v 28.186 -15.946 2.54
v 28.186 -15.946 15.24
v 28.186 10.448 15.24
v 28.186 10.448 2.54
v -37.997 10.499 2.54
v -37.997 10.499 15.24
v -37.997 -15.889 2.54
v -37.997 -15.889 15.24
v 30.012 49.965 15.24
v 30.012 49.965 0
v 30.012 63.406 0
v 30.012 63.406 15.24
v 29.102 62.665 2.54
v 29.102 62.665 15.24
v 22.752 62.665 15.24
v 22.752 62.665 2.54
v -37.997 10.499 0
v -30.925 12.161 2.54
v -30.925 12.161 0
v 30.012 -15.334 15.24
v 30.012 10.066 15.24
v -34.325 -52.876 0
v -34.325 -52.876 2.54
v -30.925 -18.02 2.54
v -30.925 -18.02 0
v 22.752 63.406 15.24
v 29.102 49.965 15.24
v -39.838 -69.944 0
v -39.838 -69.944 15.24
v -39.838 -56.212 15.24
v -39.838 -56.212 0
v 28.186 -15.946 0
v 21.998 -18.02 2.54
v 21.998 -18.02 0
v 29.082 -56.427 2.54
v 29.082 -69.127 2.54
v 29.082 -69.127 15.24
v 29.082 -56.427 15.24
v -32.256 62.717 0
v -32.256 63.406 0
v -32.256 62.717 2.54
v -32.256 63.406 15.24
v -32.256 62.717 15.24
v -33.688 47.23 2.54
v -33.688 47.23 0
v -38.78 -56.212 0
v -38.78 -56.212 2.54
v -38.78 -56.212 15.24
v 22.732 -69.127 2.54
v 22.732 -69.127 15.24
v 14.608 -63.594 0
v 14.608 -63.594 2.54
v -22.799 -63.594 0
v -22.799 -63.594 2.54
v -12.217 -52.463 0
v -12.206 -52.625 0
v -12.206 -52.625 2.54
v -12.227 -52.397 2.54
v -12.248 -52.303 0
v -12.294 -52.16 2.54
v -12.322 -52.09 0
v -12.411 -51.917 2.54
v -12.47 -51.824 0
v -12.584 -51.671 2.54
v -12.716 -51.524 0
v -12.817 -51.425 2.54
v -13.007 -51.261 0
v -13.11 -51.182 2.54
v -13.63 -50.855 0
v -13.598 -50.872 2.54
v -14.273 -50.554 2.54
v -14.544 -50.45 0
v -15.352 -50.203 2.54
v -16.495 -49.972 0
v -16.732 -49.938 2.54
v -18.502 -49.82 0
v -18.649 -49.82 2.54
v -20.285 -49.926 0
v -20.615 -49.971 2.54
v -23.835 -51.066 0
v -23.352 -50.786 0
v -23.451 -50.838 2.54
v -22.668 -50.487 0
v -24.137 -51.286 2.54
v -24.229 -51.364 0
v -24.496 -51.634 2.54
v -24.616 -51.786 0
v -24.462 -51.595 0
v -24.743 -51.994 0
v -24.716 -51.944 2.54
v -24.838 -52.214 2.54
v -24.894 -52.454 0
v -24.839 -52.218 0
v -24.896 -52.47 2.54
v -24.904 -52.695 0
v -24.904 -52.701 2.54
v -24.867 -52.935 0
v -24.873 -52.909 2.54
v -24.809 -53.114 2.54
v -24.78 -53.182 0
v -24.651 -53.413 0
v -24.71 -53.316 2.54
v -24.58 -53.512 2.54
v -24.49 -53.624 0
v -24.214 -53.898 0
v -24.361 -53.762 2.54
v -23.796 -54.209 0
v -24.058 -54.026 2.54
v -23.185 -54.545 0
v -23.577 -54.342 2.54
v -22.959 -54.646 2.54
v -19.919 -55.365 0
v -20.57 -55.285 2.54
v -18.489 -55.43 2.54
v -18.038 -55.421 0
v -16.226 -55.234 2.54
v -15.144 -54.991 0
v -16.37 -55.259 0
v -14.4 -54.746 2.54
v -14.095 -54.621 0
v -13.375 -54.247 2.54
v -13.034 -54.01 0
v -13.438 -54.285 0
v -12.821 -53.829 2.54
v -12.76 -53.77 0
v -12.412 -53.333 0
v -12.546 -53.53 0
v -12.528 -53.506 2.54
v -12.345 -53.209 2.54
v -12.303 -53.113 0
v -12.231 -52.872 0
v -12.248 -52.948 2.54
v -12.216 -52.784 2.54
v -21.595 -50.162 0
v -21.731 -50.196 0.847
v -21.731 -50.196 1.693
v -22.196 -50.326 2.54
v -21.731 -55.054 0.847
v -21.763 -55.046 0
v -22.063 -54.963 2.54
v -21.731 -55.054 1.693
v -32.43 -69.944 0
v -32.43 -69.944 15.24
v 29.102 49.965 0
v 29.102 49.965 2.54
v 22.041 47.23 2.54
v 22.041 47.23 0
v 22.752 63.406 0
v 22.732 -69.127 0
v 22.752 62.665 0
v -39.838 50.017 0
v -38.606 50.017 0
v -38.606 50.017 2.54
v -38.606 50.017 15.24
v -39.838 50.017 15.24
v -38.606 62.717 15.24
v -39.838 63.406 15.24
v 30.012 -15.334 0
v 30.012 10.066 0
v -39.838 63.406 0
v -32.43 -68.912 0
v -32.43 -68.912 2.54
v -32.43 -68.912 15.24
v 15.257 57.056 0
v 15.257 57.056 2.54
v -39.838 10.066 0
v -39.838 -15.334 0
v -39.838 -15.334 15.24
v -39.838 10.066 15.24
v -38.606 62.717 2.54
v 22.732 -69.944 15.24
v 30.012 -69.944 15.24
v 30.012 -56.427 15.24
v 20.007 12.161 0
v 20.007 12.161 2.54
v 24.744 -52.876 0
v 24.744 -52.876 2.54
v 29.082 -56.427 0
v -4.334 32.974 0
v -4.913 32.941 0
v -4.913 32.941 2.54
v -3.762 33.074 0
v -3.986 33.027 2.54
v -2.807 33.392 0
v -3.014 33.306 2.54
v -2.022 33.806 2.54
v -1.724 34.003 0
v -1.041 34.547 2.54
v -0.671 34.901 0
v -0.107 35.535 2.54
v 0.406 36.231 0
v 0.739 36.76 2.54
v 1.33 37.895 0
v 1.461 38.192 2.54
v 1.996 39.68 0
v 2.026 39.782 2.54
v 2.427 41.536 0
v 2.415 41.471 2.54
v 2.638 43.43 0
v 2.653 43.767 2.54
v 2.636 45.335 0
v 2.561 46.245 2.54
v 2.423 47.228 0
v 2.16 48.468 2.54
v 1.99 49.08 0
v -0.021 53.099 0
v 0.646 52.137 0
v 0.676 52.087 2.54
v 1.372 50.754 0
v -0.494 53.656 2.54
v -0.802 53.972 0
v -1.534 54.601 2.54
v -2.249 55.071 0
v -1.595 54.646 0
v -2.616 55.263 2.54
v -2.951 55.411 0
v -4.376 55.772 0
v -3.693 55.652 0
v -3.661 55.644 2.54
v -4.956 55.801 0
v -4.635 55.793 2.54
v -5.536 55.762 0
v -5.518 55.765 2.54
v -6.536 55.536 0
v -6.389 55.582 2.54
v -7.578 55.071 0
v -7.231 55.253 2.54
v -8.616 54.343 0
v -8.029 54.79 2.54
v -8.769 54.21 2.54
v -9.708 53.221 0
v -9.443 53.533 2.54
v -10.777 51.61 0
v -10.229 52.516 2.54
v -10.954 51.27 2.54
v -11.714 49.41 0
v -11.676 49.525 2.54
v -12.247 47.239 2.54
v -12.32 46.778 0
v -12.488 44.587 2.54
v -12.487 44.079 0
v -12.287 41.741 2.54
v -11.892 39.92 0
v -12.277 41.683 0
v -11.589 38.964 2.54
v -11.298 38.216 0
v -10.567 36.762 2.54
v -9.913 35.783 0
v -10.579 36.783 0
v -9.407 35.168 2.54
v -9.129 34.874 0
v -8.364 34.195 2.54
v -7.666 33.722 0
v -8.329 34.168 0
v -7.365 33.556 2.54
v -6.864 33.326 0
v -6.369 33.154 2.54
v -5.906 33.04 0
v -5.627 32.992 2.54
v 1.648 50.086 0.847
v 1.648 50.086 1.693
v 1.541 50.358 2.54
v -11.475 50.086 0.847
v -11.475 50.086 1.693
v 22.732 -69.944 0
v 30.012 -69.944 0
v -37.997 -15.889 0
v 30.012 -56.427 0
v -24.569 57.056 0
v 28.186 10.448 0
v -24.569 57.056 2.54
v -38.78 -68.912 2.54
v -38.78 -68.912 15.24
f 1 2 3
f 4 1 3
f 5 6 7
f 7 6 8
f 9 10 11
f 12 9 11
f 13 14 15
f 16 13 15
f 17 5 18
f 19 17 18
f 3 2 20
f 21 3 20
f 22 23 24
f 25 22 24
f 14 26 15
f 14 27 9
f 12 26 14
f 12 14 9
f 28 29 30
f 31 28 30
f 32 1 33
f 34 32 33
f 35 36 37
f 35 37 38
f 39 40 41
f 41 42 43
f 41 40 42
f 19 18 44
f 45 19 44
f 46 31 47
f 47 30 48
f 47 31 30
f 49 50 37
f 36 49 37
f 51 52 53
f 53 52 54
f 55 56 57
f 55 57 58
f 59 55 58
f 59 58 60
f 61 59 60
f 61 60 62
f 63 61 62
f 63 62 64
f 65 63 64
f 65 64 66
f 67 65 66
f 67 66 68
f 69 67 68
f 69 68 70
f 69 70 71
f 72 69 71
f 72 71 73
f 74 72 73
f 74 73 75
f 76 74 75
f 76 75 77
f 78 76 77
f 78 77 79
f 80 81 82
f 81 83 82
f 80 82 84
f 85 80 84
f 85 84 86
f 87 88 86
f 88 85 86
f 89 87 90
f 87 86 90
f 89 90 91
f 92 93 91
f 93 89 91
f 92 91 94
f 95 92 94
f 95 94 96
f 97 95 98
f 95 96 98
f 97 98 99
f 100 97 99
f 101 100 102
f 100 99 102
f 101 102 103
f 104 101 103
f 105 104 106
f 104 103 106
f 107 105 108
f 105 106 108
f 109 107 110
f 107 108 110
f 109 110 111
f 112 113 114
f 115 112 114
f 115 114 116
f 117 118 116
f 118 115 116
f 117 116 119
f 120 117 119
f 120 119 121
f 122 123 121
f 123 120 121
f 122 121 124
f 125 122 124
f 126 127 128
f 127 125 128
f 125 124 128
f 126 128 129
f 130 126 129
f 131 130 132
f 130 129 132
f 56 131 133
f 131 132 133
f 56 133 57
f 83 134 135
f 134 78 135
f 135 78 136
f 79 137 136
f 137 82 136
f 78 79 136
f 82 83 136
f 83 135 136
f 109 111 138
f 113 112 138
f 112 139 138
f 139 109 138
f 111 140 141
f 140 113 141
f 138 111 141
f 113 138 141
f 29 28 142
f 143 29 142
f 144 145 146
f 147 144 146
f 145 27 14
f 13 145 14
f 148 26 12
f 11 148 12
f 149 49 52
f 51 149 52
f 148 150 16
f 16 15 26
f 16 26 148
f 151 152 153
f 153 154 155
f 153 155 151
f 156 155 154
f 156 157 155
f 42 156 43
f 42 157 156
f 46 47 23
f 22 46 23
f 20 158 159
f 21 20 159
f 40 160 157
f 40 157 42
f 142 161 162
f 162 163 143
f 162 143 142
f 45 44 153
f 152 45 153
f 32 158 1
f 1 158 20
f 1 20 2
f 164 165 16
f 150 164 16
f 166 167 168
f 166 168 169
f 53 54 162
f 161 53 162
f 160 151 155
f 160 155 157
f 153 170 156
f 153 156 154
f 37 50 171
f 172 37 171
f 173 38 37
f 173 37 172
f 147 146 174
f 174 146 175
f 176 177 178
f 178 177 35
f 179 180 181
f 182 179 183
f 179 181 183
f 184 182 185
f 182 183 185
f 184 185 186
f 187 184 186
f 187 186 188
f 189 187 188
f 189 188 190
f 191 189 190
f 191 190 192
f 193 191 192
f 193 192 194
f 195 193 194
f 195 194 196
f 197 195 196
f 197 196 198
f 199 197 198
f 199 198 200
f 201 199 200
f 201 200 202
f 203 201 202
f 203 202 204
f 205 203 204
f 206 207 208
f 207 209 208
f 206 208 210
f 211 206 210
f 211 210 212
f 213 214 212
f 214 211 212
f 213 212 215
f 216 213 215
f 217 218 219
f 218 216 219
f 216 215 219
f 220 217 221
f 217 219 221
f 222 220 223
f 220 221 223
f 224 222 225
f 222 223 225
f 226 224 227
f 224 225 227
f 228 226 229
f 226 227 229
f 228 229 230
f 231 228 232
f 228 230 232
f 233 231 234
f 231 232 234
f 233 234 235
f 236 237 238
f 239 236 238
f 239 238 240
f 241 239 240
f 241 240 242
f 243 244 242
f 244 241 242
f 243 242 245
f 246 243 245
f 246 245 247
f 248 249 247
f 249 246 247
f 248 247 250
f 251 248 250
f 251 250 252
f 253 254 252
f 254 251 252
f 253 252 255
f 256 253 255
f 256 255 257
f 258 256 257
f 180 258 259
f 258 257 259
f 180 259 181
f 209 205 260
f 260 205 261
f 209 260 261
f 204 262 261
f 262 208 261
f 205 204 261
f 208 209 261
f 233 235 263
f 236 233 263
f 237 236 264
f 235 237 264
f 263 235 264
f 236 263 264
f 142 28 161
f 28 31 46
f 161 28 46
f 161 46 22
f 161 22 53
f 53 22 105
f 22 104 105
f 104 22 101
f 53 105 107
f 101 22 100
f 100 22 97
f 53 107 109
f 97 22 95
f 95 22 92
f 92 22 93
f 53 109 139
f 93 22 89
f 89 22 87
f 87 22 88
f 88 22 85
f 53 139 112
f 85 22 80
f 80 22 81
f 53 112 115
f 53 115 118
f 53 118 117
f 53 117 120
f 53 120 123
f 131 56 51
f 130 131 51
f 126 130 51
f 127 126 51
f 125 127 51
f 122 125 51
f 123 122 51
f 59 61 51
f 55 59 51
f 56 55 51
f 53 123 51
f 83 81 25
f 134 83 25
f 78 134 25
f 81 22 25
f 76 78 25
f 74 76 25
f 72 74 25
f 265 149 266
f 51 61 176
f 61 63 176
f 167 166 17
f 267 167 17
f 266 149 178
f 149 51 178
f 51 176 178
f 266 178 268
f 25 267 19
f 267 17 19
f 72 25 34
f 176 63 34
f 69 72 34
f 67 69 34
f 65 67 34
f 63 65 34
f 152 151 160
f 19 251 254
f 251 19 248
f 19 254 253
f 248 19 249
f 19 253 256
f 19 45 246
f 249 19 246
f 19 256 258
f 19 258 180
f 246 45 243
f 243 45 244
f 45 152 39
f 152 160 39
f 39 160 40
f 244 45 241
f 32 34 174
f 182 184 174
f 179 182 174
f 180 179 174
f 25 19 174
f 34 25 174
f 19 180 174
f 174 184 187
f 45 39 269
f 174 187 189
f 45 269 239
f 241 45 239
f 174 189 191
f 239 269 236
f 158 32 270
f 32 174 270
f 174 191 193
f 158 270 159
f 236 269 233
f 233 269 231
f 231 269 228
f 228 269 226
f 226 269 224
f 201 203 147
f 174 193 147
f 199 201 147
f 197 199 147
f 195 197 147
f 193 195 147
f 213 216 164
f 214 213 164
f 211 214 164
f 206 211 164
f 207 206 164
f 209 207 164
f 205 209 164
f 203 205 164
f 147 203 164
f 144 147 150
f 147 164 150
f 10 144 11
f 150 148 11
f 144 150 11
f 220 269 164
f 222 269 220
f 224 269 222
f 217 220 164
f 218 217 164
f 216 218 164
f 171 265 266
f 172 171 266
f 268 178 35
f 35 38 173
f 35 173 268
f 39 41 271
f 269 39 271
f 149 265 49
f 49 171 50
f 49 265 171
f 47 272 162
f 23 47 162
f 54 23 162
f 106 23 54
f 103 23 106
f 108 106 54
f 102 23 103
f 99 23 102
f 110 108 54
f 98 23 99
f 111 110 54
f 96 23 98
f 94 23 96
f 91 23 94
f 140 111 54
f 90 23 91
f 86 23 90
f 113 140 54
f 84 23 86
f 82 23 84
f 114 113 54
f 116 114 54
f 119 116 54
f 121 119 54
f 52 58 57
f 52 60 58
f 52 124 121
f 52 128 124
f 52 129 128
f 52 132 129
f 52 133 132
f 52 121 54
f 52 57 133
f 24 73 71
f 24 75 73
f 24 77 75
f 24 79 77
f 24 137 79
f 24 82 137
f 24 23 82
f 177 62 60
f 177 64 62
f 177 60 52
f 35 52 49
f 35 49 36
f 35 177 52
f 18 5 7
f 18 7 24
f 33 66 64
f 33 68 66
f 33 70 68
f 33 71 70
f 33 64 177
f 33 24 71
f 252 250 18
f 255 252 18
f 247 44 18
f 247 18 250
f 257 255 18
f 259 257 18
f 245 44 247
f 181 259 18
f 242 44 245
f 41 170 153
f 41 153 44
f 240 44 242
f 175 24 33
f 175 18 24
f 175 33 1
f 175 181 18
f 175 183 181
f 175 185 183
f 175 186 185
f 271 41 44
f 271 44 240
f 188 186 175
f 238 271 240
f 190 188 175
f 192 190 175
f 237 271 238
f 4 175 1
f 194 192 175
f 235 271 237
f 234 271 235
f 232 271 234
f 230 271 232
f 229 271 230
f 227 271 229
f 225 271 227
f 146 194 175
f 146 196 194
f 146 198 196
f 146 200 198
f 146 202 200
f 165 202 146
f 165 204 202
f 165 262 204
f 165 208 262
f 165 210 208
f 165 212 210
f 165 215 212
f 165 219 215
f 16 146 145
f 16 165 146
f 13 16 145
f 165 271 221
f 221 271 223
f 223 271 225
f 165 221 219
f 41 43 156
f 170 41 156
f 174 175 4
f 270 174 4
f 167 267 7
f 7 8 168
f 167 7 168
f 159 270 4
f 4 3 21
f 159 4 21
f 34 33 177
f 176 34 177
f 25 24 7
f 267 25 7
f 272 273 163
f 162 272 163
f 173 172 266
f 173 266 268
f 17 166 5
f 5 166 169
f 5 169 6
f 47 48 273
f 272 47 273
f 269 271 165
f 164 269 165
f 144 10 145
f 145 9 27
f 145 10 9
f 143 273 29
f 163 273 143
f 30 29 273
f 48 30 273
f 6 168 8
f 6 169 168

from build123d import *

# Parameters (mm, degrees)
F0_W     = 69.85
F0_H     = 133.35
F1_DEPTH = 15.24
F3_DEPTH = 15.241
F4_DEPTH = 15.241
F5_DEPTH = 12.7
F6_DEPTH = 15.2410001


# Not quite as in the source:
# - a feature names something its author has since deleted; it is built from what else it names


with BuildPart() as f1:
    # F0 (on Top) → F1 (new body)
    with BuildSketch(Plane.XY):
        with Locations((-4.9132461604, -3.2689645886)):
            Rectangle(F0_W, F0_H)
    extrude(amount=F1_DEPTH)

    # F2 (on face) → F3 (cut, through all)
    with BuildSketch(Plane.XY.offset(15.24)):
        Polygon((-4.9132461604, 63.4060354114), (-32.2555484414, 63.4060354114), (-32.2555484414, 62.717136082), (-24.5693009347, 57.0560354114), (-4.9132461604, 57.0560354114), align=None)
        Polygon((-38.6055484414, 50.017136082), (-39.8382461604, 50.017136082), (-39.8382461604, 10.0660354114), (-37.9972373044, 10.4986778455), (-30.9245064855, 12.1607901528), (-33.6875207722, 47.2298189998), align=None)
        Polygon((22.7516740561, 63.4060354114), (-4.9132461604, 63.4060354114), (-4.9132461604, 57.0560354114), (15.2570633218, 57.0560354114), (22.7516740561, 62.6652065337), align=None)
        Polygon((-37.9972373044, -15.8886924859), (-39.8382461604, -15.3339645886), (-39.8382461604, -55.9739645886), (-39.8382461604, -56.2118504524), (-38.7796634255, -56.2118504524), (-34.3251377344, -52.876316011), (-30.9245064855, -18.0198289454), align=None)
        Polygon((30.0117538396, 49.9652065337), (29.1016740561, 49.9652065337), (22.0408134996, 47.2298189998), (20.0073712407, 12.1607901528), (28.1864475644, 10.4482248105), (30.0117538396, 10.0660354114), align=None)
        Polygon((-32.4296634255, -68.9118504524), (-32.4296634255, -69.9439645886), (-6.858468987, -69.9439645886), (-6.858468987, -63.5939645886), (-22.7989349514, -63.5939645886), align=None)
        Polygon((30.0117538396, -55.9739645886), (30.0117538396, -15.3339645886), (28.1864475644, -15.9457166114), (21.9978448004, -18.0198289454), (24.7441133717, -52.876316011), (29.0817226684, -56.4274404526), (30.0117538396, -56.4274404526), align=None)
        Polygon((-6.858468987, -63.5939645886), (-6.858468987, -69.9439645886), (22.7317226684, -69.9439645886), (22.7317226684, -69.1274404526), (14.6080274135, -63.5939645886), align=None)
    extrude(amount=-F3_DEPTH, mode=Mode.SUBTRACT)

    # F2 (on face) → F4 (cut, through all)
    with BuildSketch(Plane.XY.offset(15.24)):
        with BuildLine():
            add(Edge.make_bspline(
                [(-4.9132461604, 32.9410274994), (8.2097492076, 32.9410274994), (1.6482515236, 50.0860274994), (-4.9132461604, 67.2310274994), (-11.4747438444, 50.0860274994), (-18.0362415283, 32.9410274994), (-4.9132461604, 32.9410274994)],
                knots=[0, 0, 0, 2.0943951024, 2.0943951024, 4.1887902048, 4.1887902048, 6.2831853072, 6.2831853072, 6.2831853072], degree=2, weights=[1, 0.5, 1, 0.5, 1, 0.5, 1]))
        make_face()
    extrude(amount=-F4_DEPTH, mode=Mode.SUBTRACT)

    # F2 (on face) → F5 (cut)
    with BuildSketch(Plane.XY.offset(15.24)):
        Polygon((-24.5693009347, 57.0560354114), (-32.2555484414, 62.717136082), (-38.6055484414, 62.717136082), (-38.6055484414, 50.017136082), (-33.6875207722, 47.2298189998), (-30.9245064855, 12.1607901528), (-37.9972373044, 10.4986778455), (-37.9972373044, -15.8886924859), (-30.9245064855, -18.0198289454), (-34.3251377344, -52.876316011), (-38.7796634255, -56.2118504524), (-38.7796634255, -68.9118504524), (-32.4296634255, -68.9118504524), (-22.7989349514, -63.5939645886), (-6.858468987, -63.5939645886), (14.6080274135, -63.5939645886), (22.7317226684, -69.1274404526), (29.0817226684, -69.1274404526), (29.0817226684, -56.4274404526), (24.7441133717, -52.876316011), (21.9978448004, -18.0198289454), (28.1864475644, -15.9457166114), (28.1864475644, 10.4482248105), (20.0073712407, 12.1607901528), (22.0408134996, 47.2298189998), (29.1016740561, 49.9652065337), (29.1016740561, 62.6652065337), (22.7516740561, 62.6652065337), (15.2570633218, 57.0560354114), (-4.9132461604, 57.0560354114), align=None)
        with BuildLine():
            add(Edge.make_bspline(
                [(-12.2060639948, -52.6248924434), (-12.2060639948, -47.7662279623), (-21.7310639948, -50.1955602028), (-31.2560639948, -52.6248924434), (-21.7310639948, -55.054224684), (-12.2060639948, -57.4835569246), (-12.2060639948, -52.6248924434)],
                knots=[0, 0, 0, 2.0943951024, 2.0943951024, 4.1887902048, 4.1887902048, 6.2831853072, 6.2831853072, 6.2831853072], degree=2, weights=[1, 0.5, 1, 0.5, 1, 0.5, 1]))
        make_face(mode=Mode.SUBTRACT)
        with BuildLine():
            add(Edge.make_bspline(
                [(-4.9132461604, 32.9410274994), (8.2097492076, 32.9410274994), (1.6482515236, 50.0860274994), (-4.9132461604, 67.2310274994), (-11.4747438444, 50.0860274994), (-18.0362415283, 32.9410274994), (-4.9132461604, 32.9410274994)],
                knots=[0, 0, 0, 2.0943951024, 2.0943951024, 4.1887902048, 4.1887902048, 6.2831853072, 6.2831853072, 6.2831853072], degree=2, weights=[1, 0.5, 1, 0.5, 1, 0.5, 1]))
        make_face(mode=Mode.SUBTRACT)
    extrude(amount=-F5_DEPTH, mode=Mode.SUBTRACT)

    # F6 (cut, through all): a face of the model
    f6_faces = [f1.faces().sort_by_distance(p)[0] for p in [
        (-18.5223410281, -52.6248924434, 15.24),
    ]]
    extrude(f6_faces, amount=-F6_DEPTH, mode=Mode.SUBTRACT)


solid = f1.part
